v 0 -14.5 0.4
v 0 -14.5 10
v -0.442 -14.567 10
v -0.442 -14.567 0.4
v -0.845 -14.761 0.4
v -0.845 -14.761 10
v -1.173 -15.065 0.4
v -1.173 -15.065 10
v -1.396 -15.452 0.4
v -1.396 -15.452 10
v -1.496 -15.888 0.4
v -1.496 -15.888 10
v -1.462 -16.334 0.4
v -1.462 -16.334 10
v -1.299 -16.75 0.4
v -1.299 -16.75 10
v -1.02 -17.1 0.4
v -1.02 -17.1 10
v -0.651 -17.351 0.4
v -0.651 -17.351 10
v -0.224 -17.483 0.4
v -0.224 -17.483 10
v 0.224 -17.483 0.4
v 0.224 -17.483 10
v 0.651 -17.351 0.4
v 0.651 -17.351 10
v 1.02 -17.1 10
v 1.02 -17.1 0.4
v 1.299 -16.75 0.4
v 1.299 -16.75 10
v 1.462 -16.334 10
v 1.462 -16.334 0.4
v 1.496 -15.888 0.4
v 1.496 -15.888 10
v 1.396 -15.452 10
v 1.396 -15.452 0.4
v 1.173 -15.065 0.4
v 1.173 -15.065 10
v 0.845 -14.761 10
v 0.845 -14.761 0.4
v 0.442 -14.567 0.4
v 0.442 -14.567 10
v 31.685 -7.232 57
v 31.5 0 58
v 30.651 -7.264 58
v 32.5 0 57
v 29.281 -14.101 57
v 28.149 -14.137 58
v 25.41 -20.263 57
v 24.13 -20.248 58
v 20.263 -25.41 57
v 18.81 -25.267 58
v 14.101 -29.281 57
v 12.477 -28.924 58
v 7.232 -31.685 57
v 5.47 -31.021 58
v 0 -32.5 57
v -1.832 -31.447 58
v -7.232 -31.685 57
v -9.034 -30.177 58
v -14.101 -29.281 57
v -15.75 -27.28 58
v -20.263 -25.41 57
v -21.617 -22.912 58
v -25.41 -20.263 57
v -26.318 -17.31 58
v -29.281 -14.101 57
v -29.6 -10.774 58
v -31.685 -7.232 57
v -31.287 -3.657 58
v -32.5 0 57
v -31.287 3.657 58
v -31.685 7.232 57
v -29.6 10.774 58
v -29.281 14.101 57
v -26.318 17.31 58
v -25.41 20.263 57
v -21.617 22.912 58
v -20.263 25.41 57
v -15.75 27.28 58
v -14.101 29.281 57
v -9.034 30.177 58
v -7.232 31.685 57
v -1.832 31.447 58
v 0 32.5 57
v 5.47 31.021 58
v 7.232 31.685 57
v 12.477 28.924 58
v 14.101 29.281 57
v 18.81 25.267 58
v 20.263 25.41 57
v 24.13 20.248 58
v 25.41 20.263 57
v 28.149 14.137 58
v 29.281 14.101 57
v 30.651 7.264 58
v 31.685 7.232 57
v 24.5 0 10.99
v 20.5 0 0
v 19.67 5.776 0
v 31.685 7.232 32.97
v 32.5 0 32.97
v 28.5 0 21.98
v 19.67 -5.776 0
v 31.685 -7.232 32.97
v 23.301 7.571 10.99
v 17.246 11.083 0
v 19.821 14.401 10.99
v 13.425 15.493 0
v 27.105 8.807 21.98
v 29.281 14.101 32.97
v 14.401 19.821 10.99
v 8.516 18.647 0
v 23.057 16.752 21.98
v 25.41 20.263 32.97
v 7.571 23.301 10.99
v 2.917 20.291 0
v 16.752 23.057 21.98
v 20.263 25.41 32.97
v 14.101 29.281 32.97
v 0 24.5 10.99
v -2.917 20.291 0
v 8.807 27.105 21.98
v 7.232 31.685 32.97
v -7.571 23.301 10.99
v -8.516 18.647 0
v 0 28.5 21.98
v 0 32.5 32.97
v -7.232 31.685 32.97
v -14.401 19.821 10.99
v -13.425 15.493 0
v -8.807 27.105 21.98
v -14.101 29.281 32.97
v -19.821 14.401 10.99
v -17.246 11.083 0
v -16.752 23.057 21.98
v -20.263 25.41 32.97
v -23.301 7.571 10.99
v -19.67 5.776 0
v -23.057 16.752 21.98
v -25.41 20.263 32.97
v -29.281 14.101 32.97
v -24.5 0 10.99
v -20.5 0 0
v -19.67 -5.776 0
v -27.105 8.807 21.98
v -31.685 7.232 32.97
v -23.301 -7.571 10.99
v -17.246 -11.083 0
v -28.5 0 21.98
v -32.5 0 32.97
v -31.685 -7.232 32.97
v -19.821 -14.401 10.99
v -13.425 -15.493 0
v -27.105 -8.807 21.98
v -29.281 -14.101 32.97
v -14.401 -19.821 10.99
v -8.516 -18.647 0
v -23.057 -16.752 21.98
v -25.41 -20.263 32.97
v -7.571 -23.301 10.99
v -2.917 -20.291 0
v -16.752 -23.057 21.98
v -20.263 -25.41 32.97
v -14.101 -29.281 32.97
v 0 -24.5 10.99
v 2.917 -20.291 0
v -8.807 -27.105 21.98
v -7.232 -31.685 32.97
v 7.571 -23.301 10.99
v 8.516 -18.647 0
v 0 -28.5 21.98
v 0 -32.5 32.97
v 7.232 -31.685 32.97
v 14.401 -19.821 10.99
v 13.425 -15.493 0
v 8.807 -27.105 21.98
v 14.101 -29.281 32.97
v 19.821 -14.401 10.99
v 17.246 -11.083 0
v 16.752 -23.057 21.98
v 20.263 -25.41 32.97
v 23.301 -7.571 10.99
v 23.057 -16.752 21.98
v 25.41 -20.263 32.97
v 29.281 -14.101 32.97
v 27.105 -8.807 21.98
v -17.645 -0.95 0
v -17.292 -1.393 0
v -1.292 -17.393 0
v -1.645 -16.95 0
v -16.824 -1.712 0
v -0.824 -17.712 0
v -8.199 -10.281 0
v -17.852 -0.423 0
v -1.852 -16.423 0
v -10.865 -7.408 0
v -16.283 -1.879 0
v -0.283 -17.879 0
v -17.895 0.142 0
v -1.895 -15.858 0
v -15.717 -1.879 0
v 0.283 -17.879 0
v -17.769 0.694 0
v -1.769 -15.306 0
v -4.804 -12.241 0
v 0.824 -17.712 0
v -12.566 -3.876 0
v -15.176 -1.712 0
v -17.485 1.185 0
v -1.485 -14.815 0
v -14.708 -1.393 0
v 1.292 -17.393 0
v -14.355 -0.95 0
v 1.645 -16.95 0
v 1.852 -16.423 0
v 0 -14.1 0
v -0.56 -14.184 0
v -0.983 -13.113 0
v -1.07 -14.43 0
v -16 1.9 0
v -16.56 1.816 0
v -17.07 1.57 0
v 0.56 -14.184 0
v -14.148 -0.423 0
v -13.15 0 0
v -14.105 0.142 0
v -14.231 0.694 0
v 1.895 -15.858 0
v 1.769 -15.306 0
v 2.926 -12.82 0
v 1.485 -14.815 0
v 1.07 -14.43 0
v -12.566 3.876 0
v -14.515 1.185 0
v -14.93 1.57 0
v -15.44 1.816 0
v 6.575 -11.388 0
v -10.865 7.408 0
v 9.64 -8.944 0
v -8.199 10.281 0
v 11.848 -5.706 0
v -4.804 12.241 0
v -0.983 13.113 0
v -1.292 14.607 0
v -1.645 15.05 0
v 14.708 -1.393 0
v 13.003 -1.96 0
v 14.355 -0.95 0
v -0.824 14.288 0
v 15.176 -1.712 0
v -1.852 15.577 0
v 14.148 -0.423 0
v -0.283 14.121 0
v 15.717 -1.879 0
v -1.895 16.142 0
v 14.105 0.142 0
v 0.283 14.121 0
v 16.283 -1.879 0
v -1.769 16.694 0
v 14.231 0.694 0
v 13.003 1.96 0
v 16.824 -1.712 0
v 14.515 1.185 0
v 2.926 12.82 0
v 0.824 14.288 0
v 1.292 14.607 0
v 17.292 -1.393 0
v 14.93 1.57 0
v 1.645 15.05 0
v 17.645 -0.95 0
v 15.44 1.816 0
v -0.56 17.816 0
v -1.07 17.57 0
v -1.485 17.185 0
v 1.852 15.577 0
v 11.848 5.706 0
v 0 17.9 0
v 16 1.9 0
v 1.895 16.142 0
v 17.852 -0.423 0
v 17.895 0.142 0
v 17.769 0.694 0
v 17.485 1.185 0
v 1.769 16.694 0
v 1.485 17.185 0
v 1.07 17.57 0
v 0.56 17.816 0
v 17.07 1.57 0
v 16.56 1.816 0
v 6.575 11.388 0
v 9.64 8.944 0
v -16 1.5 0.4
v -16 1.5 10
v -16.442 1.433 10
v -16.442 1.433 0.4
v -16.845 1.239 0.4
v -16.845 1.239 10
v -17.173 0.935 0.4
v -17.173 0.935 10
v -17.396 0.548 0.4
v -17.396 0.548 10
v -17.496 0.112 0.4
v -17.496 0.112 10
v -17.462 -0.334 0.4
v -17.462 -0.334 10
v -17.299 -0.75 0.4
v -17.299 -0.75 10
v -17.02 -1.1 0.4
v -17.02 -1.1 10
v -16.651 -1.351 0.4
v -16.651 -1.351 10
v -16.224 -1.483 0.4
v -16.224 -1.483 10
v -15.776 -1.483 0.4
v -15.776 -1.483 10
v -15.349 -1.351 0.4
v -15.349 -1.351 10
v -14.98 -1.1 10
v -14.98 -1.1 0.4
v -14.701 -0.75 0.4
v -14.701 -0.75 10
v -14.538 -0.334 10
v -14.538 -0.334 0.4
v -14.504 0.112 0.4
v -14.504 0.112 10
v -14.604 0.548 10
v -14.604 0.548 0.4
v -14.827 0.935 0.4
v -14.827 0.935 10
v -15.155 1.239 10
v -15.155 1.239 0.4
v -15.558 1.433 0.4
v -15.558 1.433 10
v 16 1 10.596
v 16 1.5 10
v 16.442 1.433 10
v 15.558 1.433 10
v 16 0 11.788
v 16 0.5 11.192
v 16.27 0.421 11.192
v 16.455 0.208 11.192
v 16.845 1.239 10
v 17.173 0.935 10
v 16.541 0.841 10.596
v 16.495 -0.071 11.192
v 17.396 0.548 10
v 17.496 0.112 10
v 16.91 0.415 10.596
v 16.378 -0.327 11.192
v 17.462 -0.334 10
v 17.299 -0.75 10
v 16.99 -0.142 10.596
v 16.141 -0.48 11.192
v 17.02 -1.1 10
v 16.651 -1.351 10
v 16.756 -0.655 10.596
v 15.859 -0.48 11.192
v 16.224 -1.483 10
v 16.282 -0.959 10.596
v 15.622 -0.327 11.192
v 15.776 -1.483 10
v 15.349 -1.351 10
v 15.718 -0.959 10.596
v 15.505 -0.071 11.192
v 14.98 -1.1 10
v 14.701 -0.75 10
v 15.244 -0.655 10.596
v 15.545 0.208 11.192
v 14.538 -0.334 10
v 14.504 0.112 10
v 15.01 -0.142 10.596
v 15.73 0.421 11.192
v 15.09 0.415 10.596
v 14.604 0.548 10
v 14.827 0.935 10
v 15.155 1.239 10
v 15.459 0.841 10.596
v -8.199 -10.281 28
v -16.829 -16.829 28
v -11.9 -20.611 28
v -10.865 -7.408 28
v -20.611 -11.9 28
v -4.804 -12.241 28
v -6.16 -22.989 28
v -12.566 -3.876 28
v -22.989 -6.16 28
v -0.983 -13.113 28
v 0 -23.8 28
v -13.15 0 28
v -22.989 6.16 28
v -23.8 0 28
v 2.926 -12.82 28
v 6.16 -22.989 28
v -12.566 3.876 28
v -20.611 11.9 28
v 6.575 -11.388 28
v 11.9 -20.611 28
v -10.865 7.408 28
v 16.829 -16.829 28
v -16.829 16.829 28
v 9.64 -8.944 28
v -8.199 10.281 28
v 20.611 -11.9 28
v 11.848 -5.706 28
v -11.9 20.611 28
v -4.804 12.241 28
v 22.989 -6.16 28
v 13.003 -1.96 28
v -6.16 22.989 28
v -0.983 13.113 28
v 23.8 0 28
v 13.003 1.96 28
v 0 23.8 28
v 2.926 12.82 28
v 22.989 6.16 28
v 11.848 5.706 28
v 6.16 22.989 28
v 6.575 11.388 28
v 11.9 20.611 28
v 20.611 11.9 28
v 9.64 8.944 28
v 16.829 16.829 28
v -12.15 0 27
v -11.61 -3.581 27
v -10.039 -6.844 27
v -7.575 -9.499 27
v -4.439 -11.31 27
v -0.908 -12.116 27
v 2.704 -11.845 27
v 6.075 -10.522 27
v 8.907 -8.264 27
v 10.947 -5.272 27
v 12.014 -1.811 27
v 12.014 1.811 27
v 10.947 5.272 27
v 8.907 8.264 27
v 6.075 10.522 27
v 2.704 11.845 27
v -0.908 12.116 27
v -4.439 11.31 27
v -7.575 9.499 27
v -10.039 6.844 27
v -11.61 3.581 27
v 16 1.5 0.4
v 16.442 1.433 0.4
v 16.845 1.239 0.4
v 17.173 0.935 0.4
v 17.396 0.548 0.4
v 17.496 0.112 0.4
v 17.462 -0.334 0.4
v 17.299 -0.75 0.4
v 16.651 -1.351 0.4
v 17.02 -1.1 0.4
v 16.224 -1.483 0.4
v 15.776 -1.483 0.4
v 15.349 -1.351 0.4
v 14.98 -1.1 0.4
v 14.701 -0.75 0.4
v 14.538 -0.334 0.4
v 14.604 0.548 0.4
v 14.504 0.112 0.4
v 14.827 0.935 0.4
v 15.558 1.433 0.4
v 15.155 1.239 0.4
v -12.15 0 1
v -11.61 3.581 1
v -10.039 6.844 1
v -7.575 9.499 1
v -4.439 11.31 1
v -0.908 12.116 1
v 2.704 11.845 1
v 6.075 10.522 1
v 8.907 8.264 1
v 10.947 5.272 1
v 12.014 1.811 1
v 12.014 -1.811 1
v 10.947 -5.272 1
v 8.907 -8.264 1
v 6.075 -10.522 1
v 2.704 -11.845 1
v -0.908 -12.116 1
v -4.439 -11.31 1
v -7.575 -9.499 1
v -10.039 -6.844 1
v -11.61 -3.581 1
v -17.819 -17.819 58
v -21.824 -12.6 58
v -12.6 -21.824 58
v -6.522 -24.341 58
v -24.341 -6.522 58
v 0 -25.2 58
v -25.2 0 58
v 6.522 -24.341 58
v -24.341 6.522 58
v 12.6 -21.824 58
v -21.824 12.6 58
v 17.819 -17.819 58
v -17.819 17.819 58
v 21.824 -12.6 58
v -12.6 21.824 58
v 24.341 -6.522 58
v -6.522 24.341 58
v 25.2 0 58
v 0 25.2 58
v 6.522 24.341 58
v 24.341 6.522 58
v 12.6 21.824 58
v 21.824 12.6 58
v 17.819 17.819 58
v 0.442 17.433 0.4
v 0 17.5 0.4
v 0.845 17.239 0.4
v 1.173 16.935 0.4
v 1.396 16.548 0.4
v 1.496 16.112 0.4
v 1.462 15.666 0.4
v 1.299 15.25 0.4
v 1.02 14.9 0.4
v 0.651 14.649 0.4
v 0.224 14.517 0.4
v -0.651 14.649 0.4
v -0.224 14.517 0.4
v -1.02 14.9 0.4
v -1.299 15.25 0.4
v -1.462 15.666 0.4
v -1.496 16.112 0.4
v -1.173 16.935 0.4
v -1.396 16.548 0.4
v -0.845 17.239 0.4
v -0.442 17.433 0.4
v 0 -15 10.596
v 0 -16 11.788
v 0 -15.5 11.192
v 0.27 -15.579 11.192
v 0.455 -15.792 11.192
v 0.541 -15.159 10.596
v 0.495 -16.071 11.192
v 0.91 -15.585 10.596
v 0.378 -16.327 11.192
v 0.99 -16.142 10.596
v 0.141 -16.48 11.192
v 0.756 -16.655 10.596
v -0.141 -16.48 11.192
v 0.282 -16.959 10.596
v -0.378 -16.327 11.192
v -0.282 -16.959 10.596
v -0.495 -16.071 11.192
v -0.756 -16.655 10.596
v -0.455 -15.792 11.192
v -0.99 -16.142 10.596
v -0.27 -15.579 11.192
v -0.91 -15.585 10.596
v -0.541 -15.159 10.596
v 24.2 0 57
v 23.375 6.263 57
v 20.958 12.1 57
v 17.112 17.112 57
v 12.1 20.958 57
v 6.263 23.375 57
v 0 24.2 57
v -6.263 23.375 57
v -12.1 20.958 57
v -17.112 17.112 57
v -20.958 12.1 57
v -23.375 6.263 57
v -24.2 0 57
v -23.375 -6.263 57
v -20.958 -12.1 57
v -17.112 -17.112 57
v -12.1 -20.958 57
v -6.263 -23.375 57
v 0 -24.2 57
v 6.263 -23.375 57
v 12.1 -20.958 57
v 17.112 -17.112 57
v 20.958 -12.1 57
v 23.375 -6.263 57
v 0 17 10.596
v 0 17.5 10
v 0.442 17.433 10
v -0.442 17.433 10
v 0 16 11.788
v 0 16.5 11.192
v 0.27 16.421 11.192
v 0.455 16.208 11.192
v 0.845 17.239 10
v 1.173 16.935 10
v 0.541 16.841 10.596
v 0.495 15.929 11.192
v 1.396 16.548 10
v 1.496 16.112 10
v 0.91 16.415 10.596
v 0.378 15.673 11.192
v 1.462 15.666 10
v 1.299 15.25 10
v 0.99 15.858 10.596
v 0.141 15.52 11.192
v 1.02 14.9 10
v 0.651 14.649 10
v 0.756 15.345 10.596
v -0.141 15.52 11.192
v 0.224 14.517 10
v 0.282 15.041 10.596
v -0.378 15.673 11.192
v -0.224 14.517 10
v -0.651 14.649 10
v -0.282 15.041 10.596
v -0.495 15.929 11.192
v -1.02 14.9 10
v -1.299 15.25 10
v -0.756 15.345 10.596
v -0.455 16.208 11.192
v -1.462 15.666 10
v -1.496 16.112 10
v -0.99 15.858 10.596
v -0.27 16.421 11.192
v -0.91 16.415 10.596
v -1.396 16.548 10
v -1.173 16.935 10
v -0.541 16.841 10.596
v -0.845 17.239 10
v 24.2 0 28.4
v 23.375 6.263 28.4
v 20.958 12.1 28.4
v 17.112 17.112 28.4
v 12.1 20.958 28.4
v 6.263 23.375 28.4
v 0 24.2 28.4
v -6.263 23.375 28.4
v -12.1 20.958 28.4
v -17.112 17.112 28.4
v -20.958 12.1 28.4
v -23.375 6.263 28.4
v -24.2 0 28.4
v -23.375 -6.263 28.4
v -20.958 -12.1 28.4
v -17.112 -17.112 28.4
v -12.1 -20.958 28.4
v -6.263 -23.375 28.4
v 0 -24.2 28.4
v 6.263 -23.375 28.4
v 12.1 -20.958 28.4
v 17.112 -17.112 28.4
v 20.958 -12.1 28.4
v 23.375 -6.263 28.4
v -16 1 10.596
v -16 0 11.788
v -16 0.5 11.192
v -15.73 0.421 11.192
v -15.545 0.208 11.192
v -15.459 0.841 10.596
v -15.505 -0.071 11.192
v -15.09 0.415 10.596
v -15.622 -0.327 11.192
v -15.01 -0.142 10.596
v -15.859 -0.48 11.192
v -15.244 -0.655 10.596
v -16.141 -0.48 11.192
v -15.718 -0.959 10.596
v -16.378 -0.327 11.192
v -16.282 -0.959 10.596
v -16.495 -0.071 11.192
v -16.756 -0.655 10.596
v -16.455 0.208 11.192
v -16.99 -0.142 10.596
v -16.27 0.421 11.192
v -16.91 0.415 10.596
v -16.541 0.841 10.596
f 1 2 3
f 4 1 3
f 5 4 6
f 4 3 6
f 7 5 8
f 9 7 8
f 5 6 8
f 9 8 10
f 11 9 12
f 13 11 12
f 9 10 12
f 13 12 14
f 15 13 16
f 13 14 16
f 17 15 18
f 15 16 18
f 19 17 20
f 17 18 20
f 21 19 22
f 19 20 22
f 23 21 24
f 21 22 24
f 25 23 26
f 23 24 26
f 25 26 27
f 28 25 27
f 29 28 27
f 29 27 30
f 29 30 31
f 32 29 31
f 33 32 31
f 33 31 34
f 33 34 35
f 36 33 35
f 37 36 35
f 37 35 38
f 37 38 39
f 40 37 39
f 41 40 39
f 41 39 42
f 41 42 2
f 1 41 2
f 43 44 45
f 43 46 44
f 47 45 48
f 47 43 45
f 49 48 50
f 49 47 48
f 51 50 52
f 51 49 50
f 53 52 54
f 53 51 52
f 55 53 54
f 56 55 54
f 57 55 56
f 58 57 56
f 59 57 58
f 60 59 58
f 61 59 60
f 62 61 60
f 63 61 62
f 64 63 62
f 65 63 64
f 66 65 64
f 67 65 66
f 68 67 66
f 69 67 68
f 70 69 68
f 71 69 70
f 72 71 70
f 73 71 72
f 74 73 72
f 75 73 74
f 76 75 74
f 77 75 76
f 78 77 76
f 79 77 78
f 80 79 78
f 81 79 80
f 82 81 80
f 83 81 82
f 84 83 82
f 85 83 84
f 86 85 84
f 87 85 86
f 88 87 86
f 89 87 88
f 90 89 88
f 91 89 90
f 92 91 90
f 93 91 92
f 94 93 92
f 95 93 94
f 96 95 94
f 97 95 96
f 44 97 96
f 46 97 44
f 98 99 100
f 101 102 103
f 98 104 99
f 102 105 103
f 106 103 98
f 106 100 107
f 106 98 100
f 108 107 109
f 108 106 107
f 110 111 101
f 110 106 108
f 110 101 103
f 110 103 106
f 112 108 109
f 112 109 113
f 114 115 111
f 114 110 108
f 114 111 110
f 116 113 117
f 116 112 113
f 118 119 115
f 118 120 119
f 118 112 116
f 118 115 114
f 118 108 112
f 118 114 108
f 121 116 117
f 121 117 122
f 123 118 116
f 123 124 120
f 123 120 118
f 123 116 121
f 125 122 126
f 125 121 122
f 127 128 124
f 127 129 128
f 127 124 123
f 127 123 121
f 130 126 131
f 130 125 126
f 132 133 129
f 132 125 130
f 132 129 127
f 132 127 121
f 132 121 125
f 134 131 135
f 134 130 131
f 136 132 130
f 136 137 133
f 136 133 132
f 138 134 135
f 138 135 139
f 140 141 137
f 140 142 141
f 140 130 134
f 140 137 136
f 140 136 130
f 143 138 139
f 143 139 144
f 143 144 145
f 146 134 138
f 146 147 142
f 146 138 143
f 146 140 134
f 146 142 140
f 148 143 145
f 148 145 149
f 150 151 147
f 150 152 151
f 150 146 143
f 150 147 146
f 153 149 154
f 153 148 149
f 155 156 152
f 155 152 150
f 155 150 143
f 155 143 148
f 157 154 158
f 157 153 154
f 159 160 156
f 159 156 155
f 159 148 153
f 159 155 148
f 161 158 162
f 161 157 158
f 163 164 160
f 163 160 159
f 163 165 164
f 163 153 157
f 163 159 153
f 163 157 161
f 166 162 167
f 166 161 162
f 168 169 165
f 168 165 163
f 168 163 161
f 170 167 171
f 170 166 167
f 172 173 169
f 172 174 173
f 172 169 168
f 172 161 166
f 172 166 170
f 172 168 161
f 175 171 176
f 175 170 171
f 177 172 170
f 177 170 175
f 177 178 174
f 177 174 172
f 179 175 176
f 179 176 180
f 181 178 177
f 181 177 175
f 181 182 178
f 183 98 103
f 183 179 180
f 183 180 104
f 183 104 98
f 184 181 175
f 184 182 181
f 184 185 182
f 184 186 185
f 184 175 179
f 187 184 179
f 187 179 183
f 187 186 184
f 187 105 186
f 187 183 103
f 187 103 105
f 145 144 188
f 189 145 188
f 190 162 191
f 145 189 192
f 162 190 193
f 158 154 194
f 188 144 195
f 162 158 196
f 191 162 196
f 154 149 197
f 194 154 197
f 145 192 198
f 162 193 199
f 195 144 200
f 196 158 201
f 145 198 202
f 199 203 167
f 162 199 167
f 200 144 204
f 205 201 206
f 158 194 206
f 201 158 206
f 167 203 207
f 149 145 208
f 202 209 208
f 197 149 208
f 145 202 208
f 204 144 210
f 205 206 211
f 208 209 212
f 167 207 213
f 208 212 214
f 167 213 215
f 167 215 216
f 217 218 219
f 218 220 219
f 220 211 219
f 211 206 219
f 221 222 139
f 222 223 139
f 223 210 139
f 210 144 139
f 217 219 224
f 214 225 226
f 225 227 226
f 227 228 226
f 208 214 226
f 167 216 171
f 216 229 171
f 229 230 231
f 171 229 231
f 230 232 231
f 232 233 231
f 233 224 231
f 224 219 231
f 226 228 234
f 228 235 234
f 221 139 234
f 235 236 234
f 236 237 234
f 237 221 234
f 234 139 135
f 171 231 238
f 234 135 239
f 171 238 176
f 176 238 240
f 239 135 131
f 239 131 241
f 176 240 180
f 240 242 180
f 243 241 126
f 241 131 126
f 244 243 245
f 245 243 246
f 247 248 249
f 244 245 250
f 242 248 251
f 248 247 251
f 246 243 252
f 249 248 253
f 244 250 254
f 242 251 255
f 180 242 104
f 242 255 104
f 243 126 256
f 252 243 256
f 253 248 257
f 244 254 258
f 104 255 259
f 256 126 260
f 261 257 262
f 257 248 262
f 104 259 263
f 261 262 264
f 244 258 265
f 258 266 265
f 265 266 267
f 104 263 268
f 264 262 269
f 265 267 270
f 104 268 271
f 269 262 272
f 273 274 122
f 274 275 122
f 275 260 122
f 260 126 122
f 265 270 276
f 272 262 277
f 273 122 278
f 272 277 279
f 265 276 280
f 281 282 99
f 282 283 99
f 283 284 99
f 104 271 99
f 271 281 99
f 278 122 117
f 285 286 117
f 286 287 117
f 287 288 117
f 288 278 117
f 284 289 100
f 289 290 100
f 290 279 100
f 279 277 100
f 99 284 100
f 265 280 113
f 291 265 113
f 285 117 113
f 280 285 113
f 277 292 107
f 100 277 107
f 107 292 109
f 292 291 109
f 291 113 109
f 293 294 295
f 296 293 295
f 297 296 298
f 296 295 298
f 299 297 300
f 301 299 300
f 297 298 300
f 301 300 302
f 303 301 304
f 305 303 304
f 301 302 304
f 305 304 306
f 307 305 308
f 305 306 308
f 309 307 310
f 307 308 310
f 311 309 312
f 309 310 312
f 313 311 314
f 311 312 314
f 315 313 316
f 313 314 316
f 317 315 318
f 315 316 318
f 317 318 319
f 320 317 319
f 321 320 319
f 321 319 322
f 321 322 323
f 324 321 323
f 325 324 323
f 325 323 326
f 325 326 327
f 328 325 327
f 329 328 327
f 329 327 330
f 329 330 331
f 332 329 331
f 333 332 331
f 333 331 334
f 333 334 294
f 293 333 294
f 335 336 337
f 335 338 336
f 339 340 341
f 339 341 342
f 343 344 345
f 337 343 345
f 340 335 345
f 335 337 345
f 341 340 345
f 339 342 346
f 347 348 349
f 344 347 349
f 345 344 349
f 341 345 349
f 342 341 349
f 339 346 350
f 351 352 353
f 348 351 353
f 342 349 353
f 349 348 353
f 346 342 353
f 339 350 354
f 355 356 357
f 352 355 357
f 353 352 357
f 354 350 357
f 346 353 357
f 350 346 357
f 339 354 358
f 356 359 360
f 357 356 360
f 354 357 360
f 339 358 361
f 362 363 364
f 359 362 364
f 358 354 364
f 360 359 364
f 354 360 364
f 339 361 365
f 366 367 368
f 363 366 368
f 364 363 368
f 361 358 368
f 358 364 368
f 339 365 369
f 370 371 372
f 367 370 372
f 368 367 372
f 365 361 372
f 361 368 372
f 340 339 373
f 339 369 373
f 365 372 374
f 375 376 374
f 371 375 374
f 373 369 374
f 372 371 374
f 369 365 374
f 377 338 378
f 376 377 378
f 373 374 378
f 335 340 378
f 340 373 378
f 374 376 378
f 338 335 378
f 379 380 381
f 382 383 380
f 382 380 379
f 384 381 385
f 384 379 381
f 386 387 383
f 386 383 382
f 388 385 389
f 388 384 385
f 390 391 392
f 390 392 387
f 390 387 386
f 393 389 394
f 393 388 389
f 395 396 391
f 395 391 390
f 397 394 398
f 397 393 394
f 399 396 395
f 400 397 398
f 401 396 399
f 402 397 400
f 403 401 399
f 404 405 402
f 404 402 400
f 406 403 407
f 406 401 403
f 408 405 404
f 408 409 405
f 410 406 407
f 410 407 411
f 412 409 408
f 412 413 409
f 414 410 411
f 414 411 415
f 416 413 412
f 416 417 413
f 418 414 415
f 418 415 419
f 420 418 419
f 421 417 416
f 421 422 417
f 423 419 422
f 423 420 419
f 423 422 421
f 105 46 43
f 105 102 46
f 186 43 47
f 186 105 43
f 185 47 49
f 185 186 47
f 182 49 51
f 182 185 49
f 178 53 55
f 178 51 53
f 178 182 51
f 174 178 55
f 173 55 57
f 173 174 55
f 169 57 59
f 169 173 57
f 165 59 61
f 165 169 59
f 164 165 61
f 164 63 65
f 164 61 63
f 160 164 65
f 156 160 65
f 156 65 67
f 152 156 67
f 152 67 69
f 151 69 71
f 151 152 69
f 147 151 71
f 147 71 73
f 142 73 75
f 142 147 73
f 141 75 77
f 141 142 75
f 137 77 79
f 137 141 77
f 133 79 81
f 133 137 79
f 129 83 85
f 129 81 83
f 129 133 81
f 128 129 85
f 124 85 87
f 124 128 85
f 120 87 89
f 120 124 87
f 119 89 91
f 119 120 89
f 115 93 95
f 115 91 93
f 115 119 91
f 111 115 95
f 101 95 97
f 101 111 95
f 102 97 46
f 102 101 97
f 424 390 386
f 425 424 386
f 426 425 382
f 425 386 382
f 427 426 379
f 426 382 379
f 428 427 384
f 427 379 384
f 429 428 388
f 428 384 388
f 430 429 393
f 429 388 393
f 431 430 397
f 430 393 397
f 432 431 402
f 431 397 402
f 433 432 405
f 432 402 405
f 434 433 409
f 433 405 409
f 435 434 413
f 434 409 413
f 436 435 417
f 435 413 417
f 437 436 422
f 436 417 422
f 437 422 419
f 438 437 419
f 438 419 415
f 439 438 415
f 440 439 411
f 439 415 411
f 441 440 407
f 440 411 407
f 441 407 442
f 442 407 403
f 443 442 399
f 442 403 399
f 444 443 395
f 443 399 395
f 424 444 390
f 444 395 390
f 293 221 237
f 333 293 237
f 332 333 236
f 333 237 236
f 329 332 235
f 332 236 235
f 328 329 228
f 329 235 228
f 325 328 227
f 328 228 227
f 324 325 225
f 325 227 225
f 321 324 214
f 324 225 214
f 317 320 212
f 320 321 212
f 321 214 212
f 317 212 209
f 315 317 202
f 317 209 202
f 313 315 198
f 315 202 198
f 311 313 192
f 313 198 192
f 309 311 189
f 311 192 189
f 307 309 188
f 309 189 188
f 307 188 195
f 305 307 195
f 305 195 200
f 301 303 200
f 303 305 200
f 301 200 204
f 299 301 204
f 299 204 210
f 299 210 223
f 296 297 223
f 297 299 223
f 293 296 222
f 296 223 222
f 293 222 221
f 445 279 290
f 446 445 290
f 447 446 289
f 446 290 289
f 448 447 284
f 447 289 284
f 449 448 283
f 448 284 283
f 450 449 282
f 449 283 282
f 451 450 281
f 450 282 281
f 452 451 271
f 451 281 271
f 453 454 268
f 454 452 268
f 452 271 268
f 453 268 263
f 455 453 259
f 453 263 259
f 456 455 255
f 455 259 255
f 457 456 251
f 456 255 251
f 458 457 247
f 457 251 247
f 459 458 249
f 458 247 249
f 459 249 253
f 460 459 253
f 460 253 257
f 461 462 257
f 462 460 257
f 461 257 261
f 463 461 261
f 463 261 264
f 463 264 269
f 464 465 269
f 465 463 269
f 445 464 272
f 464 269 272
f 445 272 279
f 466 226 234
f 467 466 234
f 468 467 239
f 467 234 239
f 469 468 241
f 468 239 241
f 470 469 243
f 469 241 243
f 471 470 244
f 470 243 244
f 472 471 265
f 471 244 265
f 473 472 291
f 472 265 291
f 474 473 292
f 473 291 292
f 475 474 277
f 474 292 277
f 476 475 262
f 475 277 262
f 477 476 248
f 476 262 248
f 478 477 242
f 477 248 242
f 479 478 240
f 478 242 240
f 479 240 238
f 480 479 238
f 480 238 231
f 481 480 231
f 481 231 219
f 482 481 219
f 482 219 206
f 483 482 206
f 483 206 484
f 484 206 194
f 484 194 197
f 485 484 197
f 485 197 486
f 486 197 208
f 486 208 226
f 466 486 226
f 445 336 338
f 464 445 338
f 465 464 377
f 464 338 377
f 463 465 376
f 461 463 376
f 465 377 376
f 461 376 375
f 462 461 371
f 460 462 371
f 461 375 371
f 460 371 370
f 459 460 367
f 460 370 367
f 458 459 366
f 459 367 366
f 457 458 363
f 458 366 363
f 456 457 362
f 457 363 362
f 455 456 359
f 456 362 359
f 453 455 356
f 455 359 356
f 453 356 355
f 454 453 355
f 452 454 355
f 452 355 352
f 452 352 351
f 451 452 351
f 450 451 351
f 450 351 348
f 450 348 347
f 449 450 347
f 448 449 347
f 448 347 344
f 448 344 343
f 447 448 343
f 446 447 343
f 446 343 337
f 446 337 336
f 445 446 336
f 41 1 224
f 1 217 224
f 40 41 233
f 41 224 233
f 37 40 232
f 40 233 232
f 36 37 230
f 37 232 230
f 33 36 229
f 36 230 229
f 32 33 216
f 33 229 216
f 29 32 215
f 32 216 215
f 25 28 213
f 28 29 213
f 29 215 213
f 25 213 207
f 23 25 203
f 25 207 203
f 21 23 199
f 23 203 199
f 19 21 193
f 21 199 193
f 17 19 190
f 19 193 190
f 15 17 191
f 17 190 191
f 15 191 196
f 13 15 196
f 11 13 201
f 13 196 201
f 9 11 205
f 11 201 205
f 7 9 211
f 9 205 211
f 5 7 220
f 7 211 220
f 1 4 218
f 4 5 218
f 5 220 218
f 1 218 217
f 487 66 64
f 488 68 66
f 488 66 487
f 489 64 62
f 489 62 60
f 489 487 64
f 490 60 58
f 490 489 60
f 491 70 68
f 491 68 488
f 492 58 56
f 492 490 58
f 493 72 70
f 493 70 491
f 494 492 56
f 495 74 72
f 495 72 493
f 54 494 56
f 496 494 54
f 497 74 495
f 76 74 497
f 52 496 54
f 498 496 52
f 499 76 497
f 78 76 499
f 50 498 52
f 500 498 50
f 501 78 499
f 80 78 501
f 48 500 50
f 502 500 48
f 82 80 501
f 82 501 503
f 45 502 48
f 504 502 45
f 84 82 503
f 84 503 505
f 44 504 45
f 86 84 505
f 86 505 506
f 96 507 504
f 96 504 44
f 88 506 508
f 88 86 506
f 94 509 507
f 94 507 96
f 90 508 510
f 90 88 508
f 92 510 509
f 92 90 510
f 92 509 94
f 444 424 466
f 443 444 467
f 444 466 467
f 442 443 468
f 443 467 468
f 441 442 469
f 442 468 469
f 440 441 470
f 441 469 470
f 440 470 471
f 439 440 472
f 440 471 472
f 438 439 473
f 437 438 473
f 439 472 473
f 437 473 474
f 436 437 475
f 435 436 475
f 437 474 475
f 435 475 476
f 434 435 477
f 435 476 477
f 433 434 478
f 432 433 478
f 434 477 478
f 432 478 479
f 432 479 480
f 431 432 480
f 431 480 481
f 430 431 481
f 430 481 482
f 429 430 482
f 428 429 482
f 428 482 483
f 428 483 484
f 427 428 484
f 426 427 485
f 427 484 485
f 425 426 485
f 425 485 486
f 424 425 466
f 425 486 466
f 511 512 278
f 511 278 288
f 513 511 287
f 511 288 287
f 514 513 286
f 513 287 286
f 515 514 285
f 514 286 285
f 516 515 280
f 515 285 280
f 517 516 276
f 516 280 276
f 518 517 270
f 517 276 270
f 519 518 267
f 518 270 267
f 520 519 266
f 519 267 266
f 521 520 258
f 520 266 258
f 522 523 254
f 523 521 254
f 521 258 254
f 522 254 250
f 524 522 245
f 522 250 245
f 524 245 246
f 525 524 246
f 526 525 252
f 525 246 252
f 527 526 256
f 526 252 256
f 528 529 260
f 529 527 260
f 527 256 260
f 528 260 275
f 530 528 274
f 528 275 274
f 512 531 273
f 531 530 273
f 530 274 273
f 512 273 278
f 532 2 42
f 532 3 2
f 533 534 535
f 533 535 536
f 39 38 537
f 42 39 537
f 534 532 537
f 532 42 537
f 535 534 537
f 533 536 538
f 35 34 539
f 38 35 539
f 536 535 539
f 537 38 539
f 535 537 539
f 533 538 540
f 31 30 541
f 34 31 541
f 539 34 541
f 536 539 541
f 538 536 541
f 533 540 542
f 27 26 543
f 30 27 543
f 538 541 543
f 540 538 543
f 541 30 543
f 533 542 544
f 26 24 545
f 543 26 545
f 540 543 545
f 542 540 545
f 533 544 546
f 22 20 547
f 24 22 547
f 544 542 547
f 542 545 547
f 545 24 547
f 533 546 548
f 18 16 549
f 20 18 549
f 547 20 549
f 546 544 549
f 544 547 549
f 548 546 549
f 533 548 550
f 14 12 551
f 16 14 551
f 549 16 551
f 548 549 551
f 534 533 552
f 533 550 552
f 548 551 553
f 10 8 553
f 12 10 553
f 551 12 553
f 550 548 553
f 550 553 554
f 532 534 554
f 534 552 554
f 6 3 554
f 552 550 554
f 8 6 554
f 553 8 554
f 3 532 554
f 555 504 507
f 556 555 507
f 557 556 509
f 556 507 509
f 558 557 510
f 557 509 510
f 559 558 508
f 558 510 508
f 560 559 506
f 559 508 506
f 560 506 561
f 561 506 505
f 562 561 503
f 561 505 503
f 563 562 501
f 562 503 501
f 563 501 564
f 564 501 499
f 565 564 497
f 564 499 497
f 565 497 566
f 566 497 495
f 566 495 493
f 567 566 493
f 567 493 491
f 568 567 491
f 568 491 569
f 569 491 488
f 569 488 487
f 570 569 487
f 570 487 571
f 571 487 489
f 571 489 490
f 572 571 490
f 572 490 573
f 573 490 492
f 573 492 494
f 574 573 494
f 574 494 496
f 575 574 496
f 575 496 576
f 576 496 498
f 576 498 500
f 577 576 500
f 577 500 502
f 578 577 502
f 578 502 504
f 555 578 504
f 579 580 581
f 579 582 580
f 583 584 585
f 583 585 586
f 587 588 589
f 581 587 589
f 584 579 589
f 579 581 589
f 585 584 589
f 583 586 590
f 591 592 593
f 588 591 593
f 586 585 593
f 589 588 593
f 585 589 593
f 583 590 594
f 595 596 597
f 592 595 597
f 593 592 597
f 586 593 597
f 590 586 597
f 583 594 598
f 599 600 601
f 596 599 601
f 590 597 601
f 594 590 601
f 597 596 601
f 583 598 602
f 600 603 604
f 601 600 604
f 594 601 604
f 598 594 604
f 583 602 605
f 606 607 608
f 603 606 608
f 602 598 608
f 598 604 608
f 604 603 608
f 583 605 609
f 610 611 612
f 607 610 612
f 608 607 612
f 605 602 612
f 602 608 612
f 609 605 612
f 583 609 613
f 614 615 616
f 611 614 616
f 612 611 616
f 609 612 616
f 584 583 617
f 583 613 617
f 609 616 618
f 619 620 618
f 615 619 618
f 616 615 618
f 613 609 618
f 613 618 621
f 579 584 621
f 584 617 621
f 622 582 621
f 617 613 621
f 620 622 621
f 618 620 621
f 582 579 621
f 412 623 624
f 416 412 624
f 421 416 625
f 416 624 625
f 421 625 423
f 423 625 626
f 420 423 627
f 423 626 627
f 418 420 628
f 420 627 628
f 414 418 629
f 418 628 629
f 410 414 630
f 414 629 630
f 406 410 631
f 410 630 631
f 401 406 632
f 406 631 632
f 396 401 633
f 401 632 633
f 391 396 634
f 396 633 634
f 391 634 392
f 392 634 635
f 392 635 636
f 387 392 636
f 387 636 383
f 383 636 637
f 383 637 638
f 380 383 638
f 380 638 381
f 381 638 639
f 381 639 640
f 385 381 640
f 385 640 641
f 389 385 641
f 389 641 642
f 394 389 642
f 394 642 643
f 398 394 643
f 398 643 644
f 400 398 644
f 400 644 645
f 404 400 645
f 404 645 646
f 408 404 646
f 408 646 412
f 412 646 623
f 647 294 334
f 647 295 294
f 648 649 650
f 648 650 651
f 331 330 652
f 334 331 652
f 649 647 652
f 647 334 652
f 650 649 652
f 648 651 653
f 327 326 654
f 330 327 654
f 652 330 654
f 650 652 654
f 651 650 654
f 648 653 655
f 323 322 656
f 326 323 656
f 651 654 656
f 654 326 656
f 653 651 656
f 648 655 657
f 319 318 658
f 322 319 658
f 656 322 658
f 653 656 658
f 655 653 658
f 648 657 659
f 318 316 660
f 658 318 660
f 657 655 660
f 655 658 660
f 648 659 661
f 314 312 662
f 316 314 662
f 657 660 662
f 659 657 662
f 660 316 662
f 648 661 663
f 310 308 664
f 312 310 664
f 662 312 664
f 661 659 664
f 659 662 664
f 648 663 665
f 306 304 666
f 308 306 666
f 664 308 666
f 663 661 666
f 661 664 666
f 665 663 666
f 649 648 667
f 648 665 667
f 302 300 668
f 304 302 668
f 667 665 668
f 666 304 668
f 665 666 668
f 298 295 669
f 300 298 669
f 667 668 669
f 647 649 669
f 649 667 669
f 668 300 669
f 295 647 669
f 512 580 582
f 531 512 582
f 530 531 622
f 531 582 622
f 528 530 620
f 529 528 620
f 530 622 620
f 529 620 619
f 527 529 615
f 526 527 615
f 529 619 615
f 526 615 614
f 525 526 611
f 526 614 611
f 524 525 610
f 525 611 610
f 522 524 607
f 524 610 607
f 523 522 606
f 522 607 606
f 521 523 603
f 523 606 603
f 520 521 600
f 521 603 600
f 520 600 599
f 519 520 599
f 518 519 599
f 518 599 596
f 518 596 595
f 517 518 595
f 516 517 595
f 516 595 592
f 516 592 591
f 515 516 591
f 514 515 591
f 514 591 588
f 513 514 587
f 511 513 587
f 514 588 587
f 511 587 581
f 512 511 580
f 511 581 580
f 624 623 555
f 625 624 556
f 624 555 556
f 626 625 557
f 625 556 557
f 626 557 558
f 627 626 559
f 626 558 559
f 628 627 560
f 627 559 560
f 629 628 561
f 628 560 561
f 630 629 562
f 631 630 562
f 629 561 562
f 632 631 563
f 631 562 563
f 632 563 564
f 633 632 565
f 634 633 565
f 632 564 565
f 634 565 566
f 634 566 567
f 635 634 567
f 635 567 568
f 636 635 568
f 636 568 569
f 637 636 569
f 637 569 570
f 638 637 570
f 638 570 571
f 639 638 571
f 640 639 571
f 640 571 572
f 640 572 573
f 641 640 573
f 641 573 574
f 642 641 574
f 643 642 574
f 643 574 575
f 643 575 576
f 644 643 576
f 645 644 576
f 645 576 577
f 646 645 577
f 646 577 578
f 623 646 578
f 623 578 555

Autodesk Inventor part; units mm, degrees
ref_plane "YZ Plane" through (0, 0, 0) normal (1, 0, 0) x (0, 1, 0)
ref_plane "XZ Plane" through (0, 0, 0) normal (0, 1, 0) x (-1, 0, 0)
ref_plane "XY Plane" through (0, 0, 0) normal (0, 0, 1) x (1, 0, 0)
sketch "Sketch1" plane through (0, 0, 0) normal (0, 0, 1) x (1, 0, 0)
  circle A0 centre (0, 0) radius 32.5
  dimension "d0" = 65
extrude "Extrusion1" add sketch "Sketch1" along normal blind 58
sketch "Sketch2" plane through (0, 0, 58) normal (0, 0, 1) x (1, 0, 0)
  circle A0 centre (0, 0) radius 24.2
  dimension "d3" = 48.4
extrude "Extrusion2" cut sketch "Sketch2" against normal blind 30
sketch "Sketch3" plane through (0, 0, 0) normal (0, 0, -1) x (-1, 0, 0)
  circle A0 centre (0, 0) radius 12.15
  dimension "d6" = 24.3
extrude "Extrusion3" cut sketch "Sketch3" against normal through all
sketch "Sketch4" plane through (0, 0, 0) normal (0, 0, -1) x (-1, 0, 0)
  circle A0 centre (0, 0) radius 16 construction
  point P0 (-16, 0)
  point P1 (16, 0)
  point P2 (0, -16)
  point P3 (0, 16)
  dimension "d9" = 32
hole "Hole1" at (16, 0, 0) at (-16, 0, 0) at (0, -16, 0) at (0, 16, 0) direction (0, 0, 1) diameter 3 depth 10 tip angle 80
chamfer "Chamfer1" distance 1 angle 45 4 edges at (-32.5, 0, 58) (12.15, 0, 0) (-24.2, 0, 58) (12.15, 0, 28)
chamfer "Chamfer2" distance 0.4 angle 45 1 edges at (-24.2, 0, 28)
chamfer "Chamfer3" distance 12 angle 70 1 edges at (-32.5, 0, 0) measured on face at (9.1116, -18.0337, 0)
chamfer "Chamfer4" distance 0.4 angle 45 4 edges at (0, -17.5, 0) (-16, -1.5, 0) (16, -1.5, 0) (0, 14.5, 0)
properties part number "FujiiEchelleColilmatorAttachement" material "ABS Plastic"
